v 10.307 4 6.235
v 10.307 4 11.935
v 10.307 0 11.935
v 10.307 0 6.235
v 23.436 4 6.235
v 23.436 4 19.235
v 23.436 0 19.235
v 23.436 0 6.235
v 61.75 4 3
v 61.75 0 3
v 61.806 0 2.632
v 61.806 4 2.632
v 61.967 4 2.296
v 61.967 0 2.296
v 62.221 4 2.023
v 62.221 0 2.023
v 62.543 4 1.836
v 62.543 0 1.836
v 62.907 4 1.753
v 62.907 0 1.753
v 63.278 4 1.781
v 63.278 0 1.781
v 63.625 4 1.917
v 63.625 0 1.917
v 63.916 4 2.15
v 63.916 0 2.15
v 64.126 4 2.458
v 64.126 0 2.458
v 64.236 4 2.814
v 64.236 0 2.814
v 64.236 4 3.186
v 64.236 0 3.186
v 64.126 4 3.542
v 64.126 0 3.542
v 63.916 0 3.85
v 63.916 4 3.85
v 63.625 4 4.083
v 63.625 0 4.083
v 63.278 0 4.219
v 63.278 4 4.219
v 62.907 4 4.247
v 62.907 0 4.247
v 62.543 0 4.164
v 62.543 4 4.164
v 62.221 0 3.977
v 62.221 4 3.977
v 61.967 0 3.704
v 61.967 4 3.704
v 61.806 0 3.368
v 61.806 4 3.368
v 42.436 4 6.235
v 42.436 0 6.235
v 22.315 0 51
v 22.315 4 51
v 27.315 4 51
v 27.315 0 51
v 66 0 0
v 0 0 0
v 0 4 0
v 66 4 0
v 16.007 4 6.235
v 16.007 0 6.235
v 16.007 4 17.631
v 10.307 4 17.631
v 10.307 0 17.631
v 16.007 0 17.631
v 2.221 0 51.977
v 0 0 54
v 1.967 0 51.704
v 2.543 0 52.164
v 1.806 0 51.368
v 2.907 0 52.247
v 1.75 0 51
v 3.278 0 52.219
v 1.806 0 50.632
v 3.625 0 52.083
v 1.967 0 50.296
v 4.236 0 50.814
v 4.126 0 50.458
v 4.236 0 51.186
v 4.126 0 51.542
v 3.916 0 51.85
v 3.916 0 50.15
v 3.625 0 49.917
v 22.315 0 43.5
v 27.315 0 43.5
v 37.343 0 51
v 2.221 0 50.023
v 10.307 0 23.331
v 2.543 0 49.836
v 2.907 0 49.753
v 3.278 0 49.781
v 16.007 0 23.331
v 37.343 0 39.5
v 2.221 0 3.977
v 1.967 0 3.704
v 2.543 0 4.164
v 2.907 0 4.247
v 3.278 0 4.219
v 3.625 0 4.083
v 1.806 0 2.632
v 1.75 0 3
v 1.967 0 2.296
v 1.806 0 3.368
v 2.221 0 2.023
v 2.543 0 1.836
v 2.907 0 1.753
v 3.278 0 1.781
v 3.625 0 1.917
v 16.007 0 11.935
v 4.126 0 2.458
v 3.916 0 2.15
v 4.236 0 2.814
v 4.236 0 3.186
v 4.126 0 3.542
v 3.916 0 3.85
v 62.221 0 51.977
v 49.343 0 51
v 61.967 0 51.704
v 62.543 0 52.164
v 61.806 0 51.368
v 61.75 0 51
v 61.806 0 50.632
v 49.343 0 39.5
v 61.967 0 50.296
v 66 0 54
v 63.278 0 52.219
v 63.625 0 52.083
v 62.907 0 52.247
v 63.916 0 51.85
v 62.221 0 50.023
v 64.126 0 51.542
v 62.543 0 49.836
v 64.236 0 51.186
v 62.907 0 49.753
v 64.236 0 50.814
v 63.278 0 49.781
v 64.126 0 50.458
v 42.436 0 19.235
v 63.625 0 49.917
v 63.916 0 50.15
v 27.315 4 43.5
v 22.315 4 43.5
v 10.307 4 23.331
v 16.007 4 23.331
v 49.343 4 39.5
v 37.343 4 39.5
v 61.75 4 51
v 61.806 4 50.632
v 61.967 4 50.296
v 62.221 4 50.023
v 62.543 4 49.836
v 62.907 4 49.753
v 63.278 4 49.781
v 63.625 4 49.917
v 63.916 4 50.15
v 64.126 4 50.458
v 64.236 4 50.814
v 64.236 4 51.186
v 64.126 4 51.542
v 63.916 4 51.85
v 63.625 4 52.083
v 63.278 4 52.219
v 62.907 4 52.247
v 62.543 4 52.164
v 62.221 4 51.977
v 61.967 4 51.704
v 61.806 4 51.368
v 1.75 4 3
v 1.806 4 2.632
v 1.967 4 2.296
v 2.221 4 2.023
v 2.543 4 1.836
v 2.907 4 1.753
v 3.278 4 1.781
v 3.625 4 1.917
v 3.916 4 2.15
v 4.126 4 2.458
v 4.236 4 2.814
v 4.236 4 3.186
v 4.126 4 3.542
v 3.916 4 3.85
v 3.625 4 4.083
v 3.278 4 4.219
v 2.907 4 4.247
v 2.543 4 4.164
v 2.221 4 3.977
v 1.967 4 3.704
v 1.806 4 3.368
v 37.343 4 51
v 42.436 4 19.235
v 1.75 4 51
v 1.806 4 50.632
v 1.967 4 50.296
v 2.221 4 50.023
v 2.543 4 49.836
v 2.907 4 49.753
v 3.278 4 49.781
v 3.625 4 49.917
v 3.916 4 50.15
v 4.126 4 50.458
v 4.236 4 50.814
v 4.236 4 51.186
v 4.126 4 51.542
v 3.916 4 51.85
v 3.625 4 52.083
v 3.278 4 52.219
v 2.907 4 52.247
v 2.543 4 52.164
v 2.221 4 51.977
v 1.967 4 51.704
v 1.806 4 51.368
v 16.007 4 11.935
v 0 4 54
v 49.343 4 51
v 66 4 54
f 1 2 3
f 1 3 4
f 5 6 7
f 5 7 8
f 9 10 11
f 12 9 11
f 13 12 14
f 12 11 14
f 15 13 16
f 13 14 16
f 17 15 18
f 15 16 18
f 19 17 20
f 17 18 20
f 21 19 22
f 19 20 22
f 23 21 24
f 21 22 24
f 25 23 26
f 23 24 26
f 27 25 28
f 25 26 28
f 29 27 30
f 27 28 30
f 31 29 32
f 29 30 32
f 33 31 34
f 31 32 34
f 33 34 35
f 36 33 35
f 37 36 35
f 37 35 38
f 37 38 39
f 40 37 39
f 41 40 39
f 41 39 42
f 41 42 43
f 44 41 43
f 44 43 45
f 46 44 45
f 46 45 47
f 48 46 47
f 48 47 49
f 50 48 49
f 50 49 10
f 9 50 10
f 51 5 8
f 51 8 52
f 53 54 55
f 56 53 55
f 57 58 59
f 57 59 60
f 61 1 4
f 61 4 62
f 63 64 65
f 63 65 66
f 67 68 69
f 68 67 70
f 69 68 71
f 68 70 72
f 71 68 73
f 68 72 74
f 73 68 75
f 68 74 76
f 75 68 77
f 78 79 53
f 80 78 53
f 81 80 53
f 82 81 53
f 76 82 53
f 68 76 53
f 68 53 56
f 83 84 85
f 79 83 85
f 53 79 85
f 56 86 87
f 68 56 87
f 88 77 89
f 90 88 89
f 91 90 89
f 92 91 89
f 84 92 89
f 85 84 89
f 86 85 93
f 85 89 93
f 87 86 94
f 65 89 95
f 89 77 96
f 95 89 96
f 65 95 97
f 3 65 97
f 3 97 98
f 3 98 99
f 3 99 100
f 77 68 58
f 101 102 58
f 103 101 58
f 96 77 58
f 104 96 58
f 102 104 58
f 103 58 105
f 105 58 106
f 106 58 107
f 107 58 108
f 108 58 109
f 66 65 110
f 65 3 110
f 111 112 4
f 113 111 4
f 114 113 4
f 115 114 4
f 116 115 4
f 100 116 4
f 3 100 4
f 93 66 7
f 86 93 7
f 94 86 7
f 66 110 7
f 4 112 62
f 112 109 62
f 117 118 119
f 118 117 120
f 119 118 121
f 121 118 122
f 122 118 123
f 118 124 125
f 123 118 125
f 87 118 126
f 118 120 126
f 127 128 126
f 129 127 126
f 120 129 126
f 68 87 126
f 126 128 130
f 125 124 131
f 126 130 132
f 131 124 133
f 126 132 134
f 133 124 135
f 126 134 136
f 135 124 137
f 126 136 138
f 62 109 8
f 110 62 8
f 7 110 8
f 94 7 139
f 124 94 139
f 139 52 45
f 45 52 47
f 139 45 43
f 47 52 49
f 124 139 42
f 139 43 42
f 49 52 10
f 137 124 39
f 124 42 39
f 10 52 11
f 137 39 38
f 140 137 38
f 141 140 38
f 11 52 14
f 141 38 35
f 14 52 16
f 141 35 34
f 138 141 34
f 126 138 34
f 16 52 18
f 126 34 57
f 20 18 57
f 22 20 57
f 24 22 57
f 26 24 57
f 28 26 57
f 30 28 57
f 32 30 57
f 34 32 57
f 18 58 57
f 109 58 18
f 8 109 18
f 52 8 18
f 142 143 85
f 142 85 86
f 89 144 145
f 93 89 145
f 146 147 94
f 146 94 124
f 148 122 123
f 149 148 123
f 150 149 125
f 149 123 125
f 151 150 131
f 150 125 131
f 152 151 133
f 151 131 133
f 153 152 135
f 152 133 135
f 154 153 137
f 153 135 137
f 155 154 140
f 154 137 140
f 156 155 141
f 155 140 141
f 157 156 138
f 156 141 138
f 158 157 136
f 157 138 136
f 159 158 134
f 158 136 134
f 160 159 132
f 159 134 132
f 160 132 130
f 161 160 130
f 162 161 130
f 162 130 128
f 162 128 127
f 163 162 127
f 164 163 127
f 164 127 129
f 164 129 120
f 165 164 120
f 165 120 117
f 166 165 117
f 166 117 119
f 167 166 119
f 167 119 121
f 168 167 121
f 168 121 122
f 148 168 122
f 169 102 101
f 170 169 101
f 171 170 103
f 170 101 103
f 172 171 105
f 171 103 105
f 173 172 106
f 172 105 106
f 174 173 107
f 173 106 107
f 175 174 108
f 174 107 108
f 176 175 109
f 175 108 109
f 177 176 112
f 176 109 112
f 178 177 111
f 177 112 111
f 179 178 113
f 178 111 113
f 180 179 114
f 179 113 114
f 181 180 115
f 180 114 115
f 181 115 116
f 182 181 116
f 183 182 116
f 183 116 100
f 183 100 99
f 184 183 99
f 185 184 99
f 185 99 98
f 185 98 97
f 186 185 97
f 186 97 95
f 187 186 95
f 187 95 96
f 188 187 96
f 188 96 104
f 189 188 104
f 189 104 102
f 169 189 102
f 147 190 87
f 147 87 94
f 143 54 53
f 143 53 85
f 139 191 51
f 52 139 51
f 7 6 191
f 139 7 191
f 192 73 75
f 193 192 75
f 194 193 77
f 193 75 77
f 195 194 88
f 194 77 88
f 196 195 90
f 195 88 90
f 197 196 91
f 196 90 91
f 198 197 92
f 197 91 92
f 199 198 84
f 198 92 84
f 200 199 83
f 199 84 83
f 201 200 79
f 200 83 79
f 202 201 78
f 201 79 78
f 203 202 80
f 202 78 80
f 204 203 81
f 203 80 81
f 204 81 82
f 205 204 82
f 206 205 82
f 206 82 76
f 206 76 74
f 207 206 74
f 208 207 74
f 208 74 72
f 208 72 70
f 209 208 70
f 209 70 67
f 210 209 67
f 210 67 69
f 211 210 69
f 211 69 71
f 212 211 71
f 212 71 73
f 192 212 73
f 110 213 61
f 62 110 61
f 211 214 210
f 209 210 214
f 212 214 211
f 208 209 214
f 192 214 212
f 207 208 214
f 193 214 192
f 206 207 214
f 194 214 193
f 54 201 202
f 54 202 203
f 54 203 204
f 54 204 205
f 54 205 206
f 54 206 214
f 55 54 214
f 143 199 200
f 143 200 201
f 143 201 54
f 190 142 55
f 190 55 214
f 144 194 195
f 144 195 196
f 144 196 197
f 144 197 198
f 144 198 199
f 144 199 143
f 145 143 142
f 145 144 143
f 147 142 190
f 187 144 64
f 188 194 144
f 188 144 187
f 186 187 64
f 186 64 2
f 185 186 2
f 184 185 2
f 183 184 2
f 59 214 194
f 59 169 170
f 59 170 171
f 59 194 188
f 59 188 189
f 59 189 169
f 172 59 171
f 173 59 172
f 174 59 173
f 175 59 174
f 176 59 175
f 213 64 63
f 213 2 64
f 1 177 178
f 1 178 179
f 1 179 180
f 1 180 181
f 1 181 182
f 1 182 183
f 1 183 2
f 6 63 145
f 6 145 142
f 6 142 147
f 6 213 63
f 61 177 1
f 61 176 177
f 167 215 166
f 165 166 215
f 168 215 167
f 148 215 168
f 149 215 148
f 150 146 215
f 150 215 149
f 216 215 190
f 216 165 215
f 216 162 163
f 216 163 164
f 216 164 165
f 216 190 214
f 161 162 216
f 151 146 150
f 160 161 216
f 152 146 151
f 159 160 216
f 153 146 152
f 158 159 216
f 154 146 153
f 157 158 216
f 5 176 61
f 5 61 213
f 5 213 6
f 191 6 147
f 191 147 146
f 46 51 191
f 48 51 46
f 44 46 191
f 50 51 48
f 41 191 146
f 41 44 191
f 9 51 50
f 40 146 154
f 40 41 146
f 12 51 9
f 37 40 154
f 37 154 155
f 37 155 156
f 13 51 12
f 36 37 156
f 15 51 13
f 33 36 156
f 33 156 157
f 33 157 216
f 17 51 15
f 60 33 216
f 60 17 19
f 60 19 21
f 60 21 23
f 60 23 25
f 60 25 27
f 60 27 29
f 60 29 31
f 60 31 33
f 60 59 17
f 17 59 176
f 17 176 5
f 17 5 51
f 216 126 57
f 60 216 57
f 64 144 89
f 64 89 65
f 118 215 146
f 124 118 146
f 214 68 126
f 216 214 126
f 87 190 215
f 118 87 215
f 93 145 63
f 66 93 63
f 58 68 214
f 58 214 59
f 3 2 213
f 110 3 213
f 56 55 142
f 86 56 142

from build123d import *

# Parameters (mm, degrees)
SKETCH_2_W          = 66
SKETCH_2_H          = 54
EXTRUDE_1_DEPTH     = 4
HOLE_WIZARD_M3_1_D  = 2.5
SKETCH_7_W          = 5
SKETCH_7_H          = 7.5
SKETCH_7_W_2        = 5.7
SKETCH_7_H_2        = 5.7
SKETCH_7_W_3        = 19
SKETCH_7_H_3        = 13
SKETCH_7_W_4        = 12
SKETCH_7_H_4        = 11.5
CUT_EXTRUDE_1_DEPTH = 4


with BuildPart() as part:
    # 草图2 → 凸台-拉伸1 (new body)
    with BuildSketch(Plane(origin=(0, 0, 0), x_dir=(1, 0, 0), z_dir=(0, 1, 0))):
        with Locations((33, -27)):
            Rectangle(SKETCH_2_W, SKETCH_2_H)
    extrude(amount=EXTRUDE_1_DEPTH)

    # M3 螺纹孔1 (through all)
    with Locations(Plane(origin=(0, 4, 0), x_dir=(1, 0, 0), z_dir=(0, 1, 0))):
        with Locations((3, -3), (3, -51), (63, -51), (63, -3)):
            Hole(HOLE_WIZARD_M3_1_D / 2)

    # 草图7 → 切除-拉伸1 (cut)
    with BuildSketch(Plane(origin=(0, 4, 0), x_dir=(1, 0, 0), z_dir=(0, 1, 0))):
        with Locations((24.815080673, -47.25)):
            Rectangle(SKETCH_7_W, SKETCH_7_H)
        with Locations((13.157222246, -9.084625301)):
            Rectangle(SKETCH_7_W_2, SKETCH_7_H_2)
        with Locations((13.157222246, -20.480710499)):
            Rectangle(SKETCH_7_W_2, SKETCH_7_H_2)
        with Locations((32.935955056, -12.734625301)):
            Rectangle(SKETCH_7_W_3, SKETCH_7_H_3)
        with Locations((43.342846772, -45.25)):
            Rectangle(SKETCH_7_W_4, SKETCH_7_H_4)
    extrude(amount=-CUT_EXTRUDE_1_DEPTH, mode=Mode.SUBTRACT)


solid = part.part
